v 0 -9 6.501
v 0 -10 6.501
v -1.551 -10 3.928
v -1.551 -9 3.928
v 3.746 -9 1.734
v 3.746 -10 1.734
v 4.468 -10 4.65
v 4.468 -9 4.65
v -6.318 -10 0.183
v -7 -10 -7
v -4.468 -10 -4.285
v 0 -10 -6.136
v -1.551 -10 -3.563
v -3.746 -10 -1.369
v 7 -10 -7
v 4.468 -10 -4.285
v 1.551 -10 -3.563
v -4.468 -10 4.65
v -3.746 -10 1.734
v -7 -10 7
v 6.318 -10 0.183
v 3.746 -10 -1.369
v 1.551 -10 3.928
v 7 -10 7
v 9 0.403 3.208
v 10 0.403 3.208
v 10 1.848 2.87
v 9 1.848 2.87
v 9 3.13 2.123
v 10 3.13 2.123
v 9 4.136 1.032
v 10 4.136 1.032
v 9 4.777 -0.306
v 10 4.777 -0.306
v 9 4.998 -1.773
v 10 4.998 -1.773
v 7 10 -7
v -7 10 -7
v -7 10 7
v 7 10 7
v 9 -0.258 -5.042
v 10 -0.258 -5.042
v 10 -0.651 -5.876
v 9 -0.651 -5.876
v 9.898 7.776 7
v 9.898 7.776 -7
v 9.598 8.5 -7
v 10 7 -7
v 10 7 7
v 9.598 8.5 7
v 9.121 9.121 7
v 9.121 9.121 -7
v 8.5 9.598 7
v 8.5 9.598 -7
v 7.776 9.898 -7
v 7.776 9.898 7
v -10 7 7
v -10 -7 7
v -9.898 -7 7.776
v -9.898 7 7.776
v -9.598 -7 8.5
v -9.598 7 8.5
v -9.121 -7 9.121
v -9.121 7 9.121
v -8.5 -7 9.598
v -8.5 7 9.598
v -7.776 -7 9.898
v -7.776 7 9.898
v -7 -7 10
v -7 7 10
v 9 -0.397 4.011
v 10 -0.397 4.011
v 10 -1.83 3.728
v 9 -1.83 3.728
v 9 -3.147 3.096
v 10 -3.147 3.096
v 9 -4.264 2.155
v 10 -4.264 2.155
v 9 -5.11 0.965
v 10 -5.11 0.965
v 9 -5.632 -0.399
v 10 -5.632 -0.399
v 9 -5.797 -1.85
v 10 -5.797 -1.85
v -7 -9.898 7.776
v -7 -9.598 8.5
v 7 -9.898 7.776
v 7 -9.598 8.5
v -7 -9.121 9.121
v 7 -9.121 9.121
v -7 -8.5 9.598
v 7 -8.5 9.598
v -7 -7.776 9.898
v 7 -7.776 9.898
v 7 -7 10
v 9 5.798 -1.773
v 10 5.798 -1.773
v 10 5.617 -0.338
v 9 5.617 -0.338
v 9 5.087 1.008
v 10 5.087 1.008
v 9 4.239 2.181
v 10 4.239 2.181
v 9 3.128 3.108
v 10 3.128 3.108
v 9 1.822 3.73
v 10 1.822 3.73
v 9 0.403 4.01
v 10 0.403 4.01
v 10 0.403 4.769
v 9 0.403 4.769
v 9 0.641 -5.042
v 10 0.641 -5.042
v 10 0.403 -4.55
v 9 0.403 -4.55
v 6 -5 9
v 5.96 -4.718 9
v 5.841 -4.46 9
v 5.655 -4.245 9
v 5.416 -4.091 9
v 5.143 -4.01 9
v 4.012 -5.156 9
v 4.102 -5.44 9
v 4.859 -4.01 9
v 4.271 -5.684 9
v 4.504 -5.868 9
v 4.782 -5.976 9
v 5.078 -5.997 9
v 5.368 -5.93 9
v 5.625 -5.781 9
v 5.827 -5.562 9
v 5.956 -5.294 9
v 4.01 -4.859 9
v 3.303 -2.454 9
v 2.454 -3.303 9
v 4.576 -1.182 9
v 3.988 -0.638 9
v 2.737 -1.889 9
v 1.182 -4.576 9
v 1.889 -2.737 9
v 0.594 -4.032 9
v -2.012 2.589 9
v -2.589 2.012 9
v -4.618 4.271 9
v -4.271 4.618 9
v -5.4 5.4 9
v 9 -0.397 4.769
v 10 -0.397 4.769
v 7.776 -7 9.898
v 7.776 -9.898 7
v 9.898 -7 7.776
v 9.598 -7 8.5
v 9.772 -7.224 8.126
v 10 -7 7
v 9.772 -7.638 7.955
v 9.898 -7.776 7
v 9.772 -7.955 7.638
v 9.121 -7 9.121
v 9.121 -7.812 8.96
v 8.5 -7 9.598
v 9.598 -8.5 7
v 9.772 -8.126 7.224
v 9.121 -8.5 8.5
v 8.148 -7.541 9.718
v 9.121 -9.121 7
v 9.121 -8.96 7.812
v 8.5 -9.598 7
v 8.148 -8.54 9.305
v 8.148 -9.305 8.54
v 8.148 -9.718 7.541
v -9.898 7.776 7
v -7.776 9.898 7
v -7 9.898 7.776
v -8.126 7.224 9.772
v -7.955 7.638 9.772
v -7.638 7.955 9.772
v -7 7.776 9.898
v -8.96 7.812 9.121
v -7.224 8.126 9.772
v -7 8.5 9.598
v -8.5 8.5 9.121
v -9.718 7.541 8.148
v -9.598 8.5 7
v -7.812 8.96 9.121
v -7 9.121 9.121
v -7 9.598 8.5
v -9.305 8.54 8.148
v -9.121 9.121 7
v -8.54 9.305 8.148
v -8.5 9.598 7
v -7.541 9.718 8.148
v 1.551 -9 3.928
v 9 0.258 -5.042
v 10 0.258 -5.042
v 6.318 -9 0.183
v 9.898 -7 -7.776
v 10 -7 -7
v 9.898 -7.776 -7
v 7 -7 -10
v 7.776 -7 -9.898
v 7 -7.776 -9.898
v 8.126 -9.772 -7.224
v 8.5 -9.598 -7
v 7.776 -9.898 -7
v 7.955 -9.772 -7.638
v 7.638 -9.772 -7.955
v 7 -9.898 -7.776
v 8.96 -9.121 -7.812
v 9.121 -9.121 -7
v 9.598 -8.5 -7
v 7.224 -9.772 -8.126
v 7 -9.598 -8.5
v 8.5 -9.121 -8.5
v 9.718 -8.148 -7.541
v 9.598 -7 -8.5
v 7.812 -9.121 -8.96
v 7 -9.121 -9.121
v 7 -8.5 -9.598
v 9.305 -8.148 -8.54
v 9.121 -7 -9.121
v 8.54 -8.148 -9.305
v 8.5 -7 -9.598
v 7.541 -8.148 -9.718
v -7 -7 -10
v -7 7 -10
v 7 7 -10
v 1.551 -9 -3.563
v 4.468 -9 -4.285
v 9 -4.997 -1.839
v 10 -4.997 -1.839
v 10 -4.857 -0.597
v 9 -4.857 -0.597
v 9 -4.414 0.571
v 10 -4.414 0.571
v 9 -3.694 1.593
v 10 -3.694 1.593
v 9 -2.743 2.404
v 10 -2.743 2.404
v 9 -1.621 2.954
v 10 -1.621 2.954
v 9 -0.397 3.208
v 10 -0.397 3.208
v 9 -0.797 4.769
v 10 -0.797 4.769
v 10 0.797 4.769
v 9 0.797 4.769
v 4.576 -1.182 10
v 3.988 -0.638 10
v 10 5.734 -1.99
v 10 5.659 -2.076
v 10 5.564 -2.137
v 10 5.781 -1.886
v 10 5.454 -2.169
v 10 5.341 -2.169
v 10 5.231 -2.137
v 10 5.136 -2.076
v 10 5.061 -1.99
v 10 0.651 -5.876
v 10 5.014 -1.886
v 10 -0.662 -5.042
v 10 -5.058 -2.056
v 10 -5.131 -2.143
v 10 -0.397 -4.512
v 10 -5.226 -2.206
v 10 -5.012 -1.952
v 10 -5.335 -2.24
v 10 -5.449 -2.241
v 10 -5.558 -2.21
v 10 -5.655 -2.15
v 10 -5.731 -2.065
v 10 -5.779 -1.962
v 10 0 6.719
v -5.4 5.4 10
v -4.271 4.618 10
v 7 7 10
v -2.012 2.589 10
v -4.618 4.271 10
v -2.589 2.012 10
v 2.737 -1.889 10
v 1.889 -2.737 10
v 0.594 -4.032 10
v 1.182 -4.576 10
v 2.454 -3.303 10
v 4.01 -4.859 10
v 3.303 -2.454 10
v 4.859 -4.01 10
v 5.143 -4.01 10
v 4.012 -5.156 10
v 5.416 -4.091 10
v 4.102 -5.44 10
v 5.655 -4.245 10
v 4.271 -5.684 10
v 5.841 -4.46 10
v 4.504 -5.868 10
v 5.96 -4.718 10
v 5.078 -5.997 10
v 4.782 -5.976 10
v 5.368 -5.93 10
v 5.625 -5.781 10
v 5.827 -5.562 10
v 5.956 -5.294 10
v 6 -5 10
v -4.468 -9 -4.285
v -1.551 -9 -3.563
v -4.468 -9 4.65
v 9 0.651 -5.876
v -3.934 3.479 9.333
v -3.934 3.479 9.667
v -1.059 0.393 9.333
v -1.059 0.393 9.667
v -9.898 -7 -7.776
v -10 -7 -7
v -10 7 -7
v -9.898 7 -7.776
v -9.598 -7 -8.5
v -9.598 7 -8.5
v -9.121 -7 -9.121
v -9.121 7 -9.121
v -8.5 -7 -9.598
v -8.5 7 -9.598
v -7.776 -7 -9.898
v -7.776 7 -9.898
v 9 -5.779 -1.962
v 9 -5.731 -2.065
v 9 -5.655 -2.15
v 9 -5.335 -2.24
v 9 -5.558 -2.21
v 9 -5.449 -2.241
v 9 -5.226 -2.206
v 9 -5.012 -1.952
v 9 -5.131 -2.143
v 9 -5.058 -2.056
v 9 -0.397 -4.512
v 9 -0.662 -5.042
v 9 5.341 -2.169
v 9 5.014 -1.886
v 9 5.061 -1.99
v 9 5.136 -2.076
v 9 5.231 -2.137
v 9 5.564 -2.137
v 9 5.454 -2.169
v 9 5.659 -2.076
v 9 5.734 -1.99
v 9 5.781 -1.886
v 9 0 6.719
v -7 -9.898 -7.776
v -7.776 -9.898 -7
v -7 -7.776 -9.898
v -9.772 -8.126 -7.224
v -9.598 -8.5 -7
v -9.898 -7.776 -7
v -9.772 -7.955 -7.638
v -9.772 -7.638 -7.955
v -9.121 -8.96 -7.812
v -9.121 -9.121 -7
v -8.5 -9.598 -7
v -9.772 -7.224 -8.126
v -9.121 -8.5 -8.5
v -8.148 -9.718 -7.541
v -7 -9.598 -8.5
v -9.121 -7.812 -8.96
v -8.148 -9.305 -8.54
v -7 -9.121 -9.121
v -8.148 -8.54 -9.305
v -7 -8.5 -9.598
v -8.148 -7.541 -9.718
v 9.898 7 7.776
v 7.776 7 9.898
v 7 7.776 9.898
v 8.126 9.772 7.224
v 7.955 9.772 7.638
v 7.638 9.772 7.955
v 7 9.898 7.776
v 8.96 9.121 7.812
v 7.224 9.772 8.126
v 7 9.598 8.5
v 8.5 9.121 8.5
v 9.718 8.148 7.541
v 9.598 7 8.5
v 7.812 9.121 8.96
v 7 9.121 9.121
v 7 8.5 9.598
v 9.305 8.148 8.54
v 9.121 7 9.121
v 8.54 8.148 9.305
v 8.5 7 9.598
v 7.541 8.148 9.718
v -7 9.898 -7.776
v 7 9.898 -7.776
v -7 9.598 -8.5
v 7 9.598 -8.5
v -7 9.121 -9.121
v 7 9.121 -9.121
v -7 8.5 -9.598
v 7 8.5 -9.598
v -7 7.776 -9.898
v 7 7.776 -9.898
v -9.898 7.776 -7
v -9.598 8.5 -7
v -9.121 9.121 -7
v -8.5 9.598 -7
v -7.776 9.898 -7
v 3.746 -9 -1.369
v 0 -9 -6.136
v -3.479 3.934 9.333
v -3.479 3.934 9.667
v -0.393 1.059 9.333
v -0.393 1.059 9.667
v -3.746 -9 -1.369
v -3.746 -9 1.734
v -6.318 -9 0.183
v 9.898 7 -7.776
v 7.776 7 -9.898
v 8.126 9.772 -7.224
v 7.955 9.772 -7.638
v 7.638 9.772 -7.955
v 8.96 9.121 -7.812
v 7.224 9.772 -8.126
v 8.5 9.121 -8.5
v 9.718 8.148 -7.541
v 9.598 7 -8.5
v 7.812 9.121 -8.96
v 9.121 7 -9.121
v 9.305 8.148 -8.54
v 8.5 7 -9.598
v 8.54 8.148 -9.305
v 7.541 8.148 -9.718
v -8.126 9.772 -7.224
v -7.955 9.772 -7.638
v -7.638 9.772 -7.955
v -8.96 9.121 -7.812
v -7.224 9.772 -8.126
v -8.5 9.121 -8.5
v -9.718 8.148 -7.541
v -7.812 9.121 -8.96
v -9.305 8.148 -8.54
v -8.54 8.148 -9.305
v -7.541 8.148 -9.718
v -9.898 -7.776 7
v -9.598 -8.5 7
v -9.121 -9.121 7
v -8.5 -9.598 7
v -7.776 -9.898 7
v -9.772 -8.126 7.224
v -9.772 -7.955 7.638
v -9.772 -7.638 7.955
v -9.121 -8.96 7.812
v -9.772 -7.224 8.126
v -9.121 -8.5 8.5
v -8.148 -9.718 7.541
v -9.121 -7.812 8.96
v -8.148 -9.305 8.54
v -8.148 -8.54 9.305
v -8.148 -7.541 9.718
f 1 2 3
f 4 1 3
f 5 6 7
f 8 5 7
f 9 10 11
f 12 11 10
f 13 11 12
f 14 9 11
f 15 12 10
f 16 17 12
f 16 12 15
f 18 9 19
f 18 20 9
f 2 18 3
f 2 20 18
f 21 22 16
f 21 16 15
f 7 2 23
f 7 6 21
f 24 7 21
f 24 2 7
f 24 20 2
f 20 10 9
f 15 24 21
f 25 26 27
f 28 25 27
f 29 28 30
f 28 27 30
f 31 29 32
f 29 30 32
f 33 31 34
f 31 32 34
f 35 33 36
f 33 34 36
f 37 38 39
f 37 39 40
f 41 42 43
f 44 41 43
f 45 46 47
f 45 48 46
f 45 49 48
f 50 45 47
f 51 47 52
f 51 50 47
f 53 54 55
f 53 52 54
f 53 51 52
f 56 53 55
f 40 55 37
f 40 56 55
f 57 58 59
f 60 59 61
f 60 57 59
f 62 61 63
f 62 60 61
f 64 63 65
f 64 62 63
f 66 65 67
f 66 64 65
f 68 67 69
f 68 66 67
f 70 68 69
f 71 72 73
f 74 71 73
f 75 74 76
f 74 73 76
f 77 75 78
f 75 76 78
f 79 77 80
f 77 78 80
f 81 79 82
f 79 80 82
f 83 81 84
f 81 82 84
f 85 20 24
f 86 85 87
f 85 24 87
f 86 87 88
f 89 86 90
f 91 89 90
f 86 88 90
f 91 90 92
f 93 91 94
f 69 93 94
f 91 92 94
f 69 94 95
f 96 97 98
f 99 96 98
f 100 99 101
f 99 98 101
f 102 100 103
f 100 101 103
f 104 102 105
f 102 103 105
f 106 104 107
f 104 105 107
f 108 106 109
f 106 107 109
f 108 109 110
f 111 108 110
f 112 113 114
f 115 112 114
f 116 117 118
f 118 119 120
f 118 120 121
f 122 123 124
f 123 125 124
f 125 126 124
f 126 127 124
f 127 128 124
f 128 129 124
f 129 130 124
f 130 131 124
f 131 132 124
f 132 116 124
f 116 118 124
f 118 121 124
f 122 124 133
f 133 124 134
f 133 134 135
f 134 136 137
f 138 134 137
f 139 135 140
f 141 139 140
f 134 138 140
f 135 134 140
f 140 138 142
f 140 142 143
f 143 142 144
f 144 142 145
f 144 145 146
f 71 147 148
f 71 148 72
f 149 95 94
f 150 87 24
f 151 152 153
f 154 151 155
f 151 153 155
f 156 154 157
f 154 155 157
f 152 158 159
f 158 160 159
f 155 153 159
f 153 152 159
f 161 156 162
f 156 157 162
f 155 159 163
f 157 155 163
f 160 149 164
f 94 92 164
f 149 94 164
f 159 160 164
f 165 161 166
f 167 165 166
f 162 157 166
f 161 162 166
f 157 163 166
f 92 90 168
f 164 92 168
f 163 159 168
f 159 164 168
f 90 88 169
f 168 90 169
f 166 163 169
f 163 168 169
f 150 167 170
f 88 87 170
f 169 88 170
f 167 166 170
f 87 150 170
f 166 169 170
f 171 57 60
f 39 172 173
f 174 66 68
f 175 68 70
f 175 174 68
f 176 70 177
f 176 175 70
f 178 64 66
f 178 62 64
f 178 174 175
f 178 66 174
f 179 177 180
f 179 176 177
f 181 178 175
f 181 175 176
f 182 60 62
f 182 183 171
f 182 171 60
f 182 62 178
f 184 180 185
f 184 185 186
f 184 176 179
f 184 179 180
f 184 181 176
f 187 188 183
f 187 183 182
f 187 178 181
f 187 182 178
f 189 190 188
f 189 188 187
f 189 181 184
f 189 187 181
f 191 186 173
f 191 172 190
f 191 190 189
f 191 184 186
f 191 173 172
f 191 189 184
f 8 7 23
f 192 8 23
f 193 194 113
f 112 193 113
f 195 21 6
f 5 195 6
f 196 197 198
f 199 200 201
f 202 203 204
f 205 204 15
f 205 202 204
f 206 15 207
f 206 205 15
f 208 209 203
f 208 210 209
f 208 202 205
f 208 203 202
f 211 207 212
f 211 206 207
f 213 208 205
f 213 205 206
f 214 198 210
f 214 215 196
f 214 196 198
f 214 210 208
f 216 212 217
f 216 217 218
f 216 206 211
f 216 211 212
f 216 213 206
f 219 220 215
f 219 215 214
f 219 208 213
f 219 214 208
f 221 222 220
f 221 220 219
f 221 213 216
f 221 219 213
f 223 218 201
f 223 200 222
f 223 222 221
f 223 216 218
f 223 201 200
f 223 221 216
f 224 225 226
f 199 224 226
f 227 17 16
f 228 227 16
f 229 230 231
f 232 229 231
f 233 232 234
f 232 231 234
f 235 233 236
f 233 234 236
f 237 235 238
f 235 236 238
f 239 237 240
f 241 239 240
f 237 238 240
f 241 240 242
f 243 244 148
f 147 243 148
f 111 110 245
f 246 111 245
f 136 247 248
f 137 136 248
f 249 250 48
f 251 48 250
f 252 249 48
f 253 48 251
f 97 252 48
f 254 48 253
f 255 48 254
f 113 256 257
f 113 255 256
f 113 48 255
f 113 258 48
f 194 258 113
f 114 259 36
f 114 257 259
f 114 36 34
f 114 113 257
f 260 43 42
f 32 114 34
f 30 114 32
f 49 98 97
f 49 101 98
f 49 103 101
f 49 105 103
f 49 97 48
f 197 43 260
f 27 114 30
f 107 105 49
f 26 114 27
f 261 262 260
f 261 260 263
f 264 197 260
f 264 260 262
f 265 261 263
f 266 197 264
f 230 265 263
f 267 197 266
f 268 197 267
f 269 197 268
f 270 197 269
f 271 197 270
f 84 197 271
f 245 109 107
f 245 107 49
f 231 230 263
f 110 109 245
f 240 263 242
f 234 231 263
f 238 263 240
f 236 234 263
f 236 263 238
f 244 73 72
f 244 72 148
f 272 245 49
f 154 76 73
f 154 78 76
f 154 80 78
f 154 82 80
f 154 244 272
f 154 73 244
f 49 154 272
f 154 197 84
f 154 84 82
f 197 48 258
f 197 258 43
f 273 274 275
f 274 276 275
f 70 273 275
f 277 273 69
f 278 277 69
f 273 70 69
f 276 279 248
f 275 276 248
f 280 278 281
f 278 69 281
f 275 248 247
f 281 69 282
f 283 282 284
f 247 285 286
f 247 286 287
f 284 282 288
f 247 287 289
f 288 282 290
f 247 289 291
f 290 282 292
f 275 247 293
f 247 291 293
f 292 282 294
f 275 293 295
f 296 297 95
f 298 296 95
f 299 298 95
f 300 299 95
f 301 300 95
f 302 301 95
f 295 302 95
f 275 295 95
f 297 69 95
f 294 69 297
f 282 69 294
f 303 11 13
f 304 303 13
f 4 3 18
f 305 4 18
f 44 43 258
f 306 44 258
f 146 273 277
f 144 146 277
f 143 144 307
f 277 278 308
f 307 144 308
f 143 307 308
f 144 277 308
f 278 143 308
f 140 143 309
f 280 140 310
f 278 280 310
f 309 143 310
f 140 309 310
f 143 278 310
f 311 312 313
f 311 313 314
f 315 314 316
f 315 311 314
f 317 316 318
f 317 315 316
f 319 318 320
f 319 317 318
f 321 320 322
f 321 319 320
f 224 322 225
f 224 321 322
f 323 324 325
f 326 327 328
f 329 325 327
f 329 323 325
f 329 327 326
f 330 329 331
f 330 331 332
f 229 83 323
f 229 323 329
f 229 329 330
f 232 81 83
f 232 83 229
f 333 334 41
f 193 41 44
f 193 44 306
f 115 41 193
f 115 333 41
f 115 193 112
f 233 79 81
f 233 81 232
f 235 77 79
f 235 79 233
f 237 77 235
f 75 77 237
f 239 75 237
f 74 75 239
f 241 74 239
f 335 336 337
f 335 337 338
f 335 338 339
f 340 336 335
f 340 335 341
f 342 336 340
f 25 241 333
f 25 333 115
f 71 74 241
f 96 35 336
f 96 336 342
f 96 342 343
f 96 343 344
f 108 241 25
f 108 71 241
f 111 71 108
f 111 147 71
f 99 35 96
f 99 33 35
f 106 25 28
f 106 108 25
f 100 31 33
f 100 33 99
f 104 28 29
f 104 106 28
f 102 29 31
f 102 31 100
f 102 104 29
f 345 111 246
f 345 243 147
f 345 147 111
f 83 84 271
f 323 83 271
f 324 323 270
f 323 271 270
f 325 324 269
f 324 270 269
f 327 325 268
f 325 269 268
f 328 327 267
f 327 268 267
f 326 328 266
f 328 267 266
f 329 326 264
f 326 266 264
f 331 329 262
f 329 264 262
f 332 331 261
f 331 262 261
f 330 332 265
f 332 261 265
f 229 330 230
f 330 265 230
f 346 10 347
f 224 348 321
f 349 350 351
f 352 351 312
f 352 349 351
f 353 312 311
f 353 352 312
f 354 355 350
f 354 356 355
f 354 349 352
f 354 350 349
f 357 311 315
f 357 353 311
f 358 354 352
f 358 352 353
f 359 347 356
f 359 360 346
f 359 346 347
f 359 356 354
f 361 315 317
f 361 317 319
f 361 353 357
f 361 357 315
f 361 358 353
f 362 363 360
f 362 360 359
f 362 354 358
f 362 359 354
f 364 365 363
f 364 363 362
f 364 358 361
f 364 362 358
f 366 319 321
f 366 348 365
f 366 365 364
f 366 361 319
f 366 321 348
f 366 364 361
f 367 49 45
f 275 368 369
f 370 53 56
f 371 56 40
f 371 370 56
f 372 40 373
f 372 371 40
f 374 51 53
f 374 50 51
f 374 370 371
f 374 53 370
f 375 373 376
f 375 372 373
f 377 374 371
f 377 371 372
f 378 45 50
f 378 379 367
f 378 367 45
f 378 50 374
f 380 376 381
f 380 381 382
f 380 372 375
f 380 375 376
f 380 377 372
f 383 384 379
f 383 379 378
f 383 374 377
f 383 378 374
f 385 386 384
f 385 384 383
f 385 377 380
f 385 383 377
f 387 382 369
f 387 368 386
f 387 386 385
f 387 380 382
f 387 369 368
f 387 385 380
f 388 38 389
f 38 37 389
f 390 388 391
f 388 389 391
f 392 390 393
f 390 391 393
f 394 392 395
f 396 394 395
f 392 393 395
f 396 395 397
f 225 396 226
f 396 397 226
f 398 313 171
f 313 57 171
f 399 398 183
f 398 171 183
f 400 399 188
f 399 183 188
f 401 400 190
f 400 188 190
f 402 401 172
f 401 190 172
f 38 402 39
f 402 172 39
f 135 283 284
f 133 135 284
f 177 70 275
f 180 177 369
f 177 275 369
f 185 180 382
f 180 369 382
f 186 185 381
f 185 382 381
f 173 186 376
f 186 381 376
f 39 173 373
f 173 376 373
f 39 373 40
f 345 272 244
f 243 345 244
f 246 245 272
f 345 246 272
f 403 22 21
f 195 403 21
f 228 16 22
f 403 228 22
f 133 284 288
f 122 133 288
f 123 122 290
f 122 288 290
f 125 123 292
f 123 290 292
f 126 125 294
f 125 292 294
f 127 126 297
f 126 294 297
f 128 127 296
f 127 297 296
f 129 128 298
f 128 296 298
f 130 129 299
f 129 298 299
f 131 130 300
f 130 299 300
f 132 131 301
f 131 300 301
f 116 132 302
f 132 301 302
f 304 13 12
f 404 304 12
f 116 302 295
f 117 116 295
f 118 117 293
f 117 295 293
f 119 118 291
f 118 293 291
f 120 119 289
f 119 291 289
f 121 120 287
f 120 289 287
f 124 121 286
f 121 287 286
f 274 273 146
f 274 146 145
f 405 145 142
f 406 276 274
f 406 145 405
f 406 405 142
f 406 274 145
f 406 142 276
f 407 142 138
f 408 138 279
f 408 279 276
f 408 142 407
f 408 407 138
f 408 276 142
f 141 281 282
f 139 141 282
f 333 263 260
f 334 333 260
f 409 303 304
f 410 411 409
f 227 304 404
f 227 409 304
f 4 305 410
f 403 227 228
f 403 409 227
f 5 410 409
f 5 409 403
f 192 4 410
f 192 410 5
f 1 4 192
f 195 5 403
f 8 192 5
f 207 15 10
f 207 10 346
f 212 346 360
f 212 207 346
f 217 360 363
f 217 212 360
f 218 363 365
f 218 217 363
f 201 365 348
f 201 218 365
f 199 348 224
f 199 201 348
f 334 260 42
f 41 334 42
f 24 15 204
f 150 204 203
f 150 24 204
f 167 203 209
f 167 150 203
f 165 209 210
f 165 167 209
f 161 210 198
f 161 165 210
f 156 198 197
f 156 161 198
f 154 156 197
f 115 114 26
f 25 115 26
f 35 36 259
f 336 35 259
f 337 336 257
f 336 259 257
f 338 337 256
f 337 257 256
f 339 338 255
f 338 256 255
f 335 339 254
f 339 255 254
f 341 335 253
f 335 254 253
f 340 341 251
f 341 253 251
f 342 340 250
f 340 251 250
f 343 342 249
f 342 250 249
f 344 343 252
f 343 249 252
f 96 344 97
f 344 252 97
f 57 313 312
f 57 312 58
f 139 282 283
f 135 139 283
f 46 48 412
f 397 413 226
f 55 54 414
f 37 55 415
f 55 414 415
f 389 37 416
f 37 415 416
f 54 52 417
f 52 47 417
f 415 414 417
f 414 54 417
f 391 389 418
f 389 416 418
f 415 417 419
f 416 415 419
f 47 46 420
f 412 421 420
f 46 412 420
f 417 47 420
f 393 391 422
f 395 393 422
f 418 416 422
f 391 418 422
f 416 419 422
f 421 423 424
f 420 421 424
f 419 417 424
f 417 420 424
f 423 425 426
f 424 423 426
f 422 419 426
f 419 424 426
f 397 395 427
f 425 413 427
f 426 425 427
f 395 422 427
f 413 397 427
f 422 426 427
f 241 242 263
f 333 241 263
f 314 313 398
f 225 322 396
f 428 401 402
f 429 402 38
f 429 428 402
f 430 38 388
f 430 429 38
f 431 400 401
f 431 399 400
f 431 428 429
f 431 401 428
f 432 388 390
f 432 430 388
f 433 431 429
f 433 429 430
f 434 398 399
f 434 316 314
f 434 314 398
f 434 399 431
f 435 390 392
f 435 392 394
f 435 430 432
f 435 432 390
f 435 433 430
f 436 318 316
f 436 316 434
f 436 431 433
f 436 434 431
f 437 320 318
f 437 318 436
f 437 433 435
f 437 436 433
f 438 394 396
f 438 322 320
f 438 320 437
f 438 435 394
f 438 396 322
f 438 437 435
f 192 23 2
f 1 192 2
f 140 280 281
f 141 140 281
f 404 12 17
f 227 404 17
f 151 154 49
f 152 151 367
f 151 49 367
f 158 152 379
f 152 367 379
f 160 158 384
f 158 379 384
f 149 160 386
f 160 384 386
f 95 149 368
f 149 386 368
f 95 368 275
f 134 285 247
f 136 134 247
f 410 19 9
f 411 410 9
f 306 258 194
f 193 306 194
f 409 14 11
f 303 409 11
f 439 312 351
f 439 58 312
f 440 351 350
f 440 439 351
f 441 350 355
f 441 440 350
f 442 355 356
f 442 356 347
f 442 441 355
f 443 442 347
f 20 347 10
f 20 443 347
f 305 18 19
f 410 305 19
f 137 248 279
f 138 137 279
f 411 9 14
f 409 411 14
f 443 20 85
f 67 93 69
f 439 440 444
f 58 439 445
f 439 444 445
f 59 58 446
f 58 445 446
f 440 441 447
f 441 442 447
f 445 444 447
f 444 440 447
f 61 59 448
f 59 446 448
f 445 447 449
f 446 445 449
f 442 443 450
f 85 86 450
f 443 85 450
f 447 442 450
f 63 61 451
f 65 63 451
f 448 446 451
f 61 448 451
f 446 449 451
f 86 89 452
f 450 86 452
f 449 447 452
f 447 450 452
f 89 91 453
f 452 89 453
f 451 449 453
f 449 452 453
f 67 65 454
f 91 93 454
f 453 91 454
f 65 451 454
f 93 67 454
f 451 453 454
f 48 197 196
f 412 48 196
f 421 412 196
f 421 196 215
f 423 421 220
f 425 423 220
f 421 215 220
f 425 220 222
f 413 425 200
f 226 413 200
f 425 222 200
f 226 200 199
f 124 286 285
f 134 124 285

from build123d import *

# Parameters (mm, degrees)
F0_W     = 20
F0_H     = 20
F1_DEPTH = 10
F2_R     = 3
F4_DEPTH = 1
F6_DEPTH = 1
F8_DEPTH = 1


with BuildPart() as f1:
    # F0 (on Front) → F1 (new body, symmetric)
    with BuildSketch(Plane.XZ):
        Rectangle(F0_W, F0_H)
    extrude(amount=F1_DEPTH, both=True)

    # F2
    f2_edges = [f1.edges().sort_by_distance(p)[0] for p in [
        (0, -10, 10),
        (10, 0, 10),
        (10, 0, -10),
        (10, 10, 0),
        (10, -10, 0),
        (0, -10, -10),
        (-10, -10, 0),
        (-10, 0, -10),
        (-10, 10, 0),
        (-10, 0, 10),
        (0, 10, 10),
        (0, 10, -10),
    ]]
    fillet(f2_edges, radius=F2_R)

    # F3 (on face) → F4 (cut)
    with BuildSketch(Plane.XZ.offset(10)):
        Polygon((1.5514445915, 3.9282802226), (0, 6.5010534599), (-1.5514445915, 3.9282802226), (-4.4677069853, 4.6504686339), (-3.745518574, 1.73420624), (-6.3182918114, 0.1827616486), (-3.745518574, -1.3686829429), (-4.4677069853, -4.2849453368), (-1.5514445915, -3.5627569255), (0, -6.1355301628), (1.5514445915, -3.5627569255), (4.4677069853, -4.2849453368), (3.745518574, -1.3686829429), (6.3182918114, 0.1827616486), (3.745518574, 1.73420624), (4.4677069853, 4.6504686339), align=None)
    extrude(amount=-F4_DEPTH, mode=Mode.SUBTRACT)

    # F5 (on face) → F6 (cut)
    with BuildSketch(Plane.YZ.offset(10)):
        with BuildLine():
            ThreePointArc((-0.3972897799, 4.0106111269), (-4.2636044951, 2.1552068742), (-5.7970421051, -1.849725524))
            ThreePointArc((-5.7970421051, -1.849725524), (-5.3918043168, -2.2444182335), (-4.9971116073, -1.8391804452))
            ThreePointArc((-4.9971116073, -1.8391804452), (-3.6938417401, 1.5928485864), (-0.3972897799, 3.2084230334))
            Line((-0.3972897799, 3.2084230334), (-0.3972897799, 4.0106111269))
        make_face()
        with BuildLine():
            Line((-0.3972897799, 4.7692186199), (-0.3972897799, 4.0106111269))
            ThreePointArc((-0.3972897799, 4.0106111269), (0.0027166939, 4.0242390941), (0.4027102201, 4.0102362518))
            Line((0.4027102201, 4.0102362518), (0.4027102201, 4.7692186199))
            Line((0.4027102201, 4.7692186199), (-0.3972897799, 4.7692186199))
        make_face()
        with BuildLine():
            ThreePointArc((0.4027102201, 4.0102362518), (0.0027166939, 4.0242390941), (-0.3972897799, 4.0106111269))
            Line((-0.3972897799, 4.0106111269), (-0.3972897799, 3.2084230334))
            ThreePointArc((-0.3972897799, 3.2084230334), (0.0027189433, 3.224238991), (0.4027102201, 3.2079877888))
            Line((0.4027102201, 3.2079877888), (0.4027102201, 4.0102362518))
        make_face()
        with BuildLine():
            ThreePointArc((5.7975457828, -1.7733060522), (4.2394733188, 2.1812360304), (0.4027102201, 4.0102362518))
            Line((0.4027102201, 4.0102362518), (0.4027102201, 3.2079877888))
            ThreePointArc((0.4027102201, 3.2079877888), (3.6734198381, 1.6151228676), (4.9975457828, -1.7733060522))
            ThreePointArc((4.9975457828, -1.7733060522), (5.3975457828, -2.1733060522), (5.7975457828, -1.7733060522))
        make_face()
        Polygon((-0.7970554871, 4.7692186199), (-0.3972897799, 4.7692186199), (0.4027102201, 4.7692186199), (0.7970554871, 4.7692186199), (0, 6.718759425), align=None)
        with BuildLine():
            ThreePointArc((0.4027102201, 3.2079877888), (0.0027189433, 3.224238991), (-0.3972897799, 3.2084230334))
            Line((-0.3972897799, 3.2084230334), (-0.3972897799, -4.5119822188))
            Line((-0.3972897799, -4.5119822188), (0, -3.7174872123))
            Line((0, -3.7174872123), (0.4027102201, -4.5496343811))
            Line((0.4027102201, -4.5496343811), (0.4027102201, 3.2079877888))
        make_face()
        Polygon((0, -3.7174872123), (-0.3972897799, -4.5119822188), (-0.6620978093, -5.0415419197), (-0.2579830259, -5.0415419197), (0, -4.4945096597), (0.2579830259, -5.0415419197), (0.6407644978, -5.0415419197), (0.4027102201, -4.5496343811), align=None)
        Polygon((0.2579830259, -5.0415419197), (-0.2579830259, -5.0415419197), (-0.6514311535, -5.8758170344), (0.6514311535, -5.8758170344), align=None)
        Polygon((0, -4.4945096597), (-0.2579830259, -5.0415419197), (0.2579830259, -5.0415419197), align=None)
    extrude(amount=-F6_DEPTH, mode=Mode.SUBTRACT)

    # F7 (on face) → F8 (cut)
    with BuildSketch(Plane.XY.offset(10)):
        with BuildLine():
            add(Edge.make_bspline(
                [(-5.4, 5.4), (-4.435118036, 5.0849730425), (-0.0419186137, 0.6489528576), (2.7372583002, -1.8887301628)],
                knots=[0, 0, 0, 0, 10.9243105059, 10.9243105059, 10.9243105059, 10.9243105059], degree=3))
            Line((-5.4, 5.4), (2.3129942315, -2.3129942315))
            Line((2.3129942315, -2.3129942315), (2.7372583002, -1.8887301628))
        make_face()
        with BuildLine():
            Line((2.3129942315, -2.3129942315), (-5.4, 5.4))
            add(Edge.make_bspline(
                [(-5.4, 5.4), (-5.0849730425, 4.435118036), (-0.6489528576, 0.0419186137), (1.8887301628, -2.7372583002)],
                knots=[0, 0, 0, 0, 10.9243105059, 10.9243105059, 10.9243105059, 10.9243105059], degree=3))
            Line((1.8887301628, -2.7372583002), (2.3129942315, -2.3129942315))
        make_face()
        Polygon((2.7372583002, -1.8887301628), (2.3129942315, -2.3129942315), (2.8786796564, -2.8786796564), (3.3029437252, -2.4544155877), (4.5757359313, -1.1816233816), (3.9882933746, -0.6376950884), align=None)
        Polygon((2.8786796564, -2.8786796564), (2.3129942315, -2.3129942315), (1.8887301628, -2.7372583002), (0.5941808249, -4.0318076381), (1.1816233816, -4.5757359313), (2.4544155877, -3.3029437252), align=None)
        with BuildLine():
            Line((3.3029437252, -2.4544155877), (2.8786796564, -2.8786796564))
            Line((2.8786796564, -2.8786796564), (4.2928932188, -4.2928932188))
            ThreePointArc((4.2928932188, -4.2928932188), (4.5527864045, -4.105572809), (4.8585786438, -4.0100505063))
            Line((4.8585786438, -4.0100505063), (3.3029437252, -2.4544155877))
        make_face()
        with BuildLine():
            Line((4.2928932188, -4.2928932188), (2.8786796564, -2.8786796564))
            Line((2.8786796564, -2.8786796564), (2.4544155877, -3.3029437252))
            Line((2.4544155877, -3.3029437252), (4.0100505063, -4.8585786438))
            ThreePointArc((4.0100505063, -4.8585786438), (4.105572809, -4.5527864045), (4.2928932188, -4.2928932188))
        make_face()
        with BuildLine():
            ThreePointArc((4.8585786438, -4.0100505063), (4.5527864045, -4.105572809), (4.2928932188, -4.2928932188))
            Line((4.2928932188, -4.2928932188), (4.4343145751, -4.4343145751))
            Line((4.4343145751, -4.4343145751), (4.8585786438, -4.0100505063))
        make_face()
        with BuildLine():
            Line((4.4343145751, -4.4343145751), (4.2928932188, -4.2928932188))
            ThreePointArc((4.2928932188, -4.2928932188), (4.105572809, -4.5527864045), (4.0100505063, -4.8585786438))
            Line((4.0100505063, -4.8585786438), (4.4343145751, -4.4343145751))
        make_face()
        with BuildLine():
            Line((4.8585786438, -4.0100505063), (4.4343145751, -4.4343145751))
            Line((4.4343145751, -4.4343145751), (4.0100505063, -4.8585786438))
            ThreePointArc((4.0100505063, -4.8585786438), (4.9291109799, -5.9974842088), (6, -5))
            ThreePointArc((6, -5), (5.6552017414, -4.244546045), (4.8585786438, -4.0100505063))
        make_face()
    extrude(amount=-F8_DEPTH, mode=Mode.SUBTRACT)


solid = f1.part
